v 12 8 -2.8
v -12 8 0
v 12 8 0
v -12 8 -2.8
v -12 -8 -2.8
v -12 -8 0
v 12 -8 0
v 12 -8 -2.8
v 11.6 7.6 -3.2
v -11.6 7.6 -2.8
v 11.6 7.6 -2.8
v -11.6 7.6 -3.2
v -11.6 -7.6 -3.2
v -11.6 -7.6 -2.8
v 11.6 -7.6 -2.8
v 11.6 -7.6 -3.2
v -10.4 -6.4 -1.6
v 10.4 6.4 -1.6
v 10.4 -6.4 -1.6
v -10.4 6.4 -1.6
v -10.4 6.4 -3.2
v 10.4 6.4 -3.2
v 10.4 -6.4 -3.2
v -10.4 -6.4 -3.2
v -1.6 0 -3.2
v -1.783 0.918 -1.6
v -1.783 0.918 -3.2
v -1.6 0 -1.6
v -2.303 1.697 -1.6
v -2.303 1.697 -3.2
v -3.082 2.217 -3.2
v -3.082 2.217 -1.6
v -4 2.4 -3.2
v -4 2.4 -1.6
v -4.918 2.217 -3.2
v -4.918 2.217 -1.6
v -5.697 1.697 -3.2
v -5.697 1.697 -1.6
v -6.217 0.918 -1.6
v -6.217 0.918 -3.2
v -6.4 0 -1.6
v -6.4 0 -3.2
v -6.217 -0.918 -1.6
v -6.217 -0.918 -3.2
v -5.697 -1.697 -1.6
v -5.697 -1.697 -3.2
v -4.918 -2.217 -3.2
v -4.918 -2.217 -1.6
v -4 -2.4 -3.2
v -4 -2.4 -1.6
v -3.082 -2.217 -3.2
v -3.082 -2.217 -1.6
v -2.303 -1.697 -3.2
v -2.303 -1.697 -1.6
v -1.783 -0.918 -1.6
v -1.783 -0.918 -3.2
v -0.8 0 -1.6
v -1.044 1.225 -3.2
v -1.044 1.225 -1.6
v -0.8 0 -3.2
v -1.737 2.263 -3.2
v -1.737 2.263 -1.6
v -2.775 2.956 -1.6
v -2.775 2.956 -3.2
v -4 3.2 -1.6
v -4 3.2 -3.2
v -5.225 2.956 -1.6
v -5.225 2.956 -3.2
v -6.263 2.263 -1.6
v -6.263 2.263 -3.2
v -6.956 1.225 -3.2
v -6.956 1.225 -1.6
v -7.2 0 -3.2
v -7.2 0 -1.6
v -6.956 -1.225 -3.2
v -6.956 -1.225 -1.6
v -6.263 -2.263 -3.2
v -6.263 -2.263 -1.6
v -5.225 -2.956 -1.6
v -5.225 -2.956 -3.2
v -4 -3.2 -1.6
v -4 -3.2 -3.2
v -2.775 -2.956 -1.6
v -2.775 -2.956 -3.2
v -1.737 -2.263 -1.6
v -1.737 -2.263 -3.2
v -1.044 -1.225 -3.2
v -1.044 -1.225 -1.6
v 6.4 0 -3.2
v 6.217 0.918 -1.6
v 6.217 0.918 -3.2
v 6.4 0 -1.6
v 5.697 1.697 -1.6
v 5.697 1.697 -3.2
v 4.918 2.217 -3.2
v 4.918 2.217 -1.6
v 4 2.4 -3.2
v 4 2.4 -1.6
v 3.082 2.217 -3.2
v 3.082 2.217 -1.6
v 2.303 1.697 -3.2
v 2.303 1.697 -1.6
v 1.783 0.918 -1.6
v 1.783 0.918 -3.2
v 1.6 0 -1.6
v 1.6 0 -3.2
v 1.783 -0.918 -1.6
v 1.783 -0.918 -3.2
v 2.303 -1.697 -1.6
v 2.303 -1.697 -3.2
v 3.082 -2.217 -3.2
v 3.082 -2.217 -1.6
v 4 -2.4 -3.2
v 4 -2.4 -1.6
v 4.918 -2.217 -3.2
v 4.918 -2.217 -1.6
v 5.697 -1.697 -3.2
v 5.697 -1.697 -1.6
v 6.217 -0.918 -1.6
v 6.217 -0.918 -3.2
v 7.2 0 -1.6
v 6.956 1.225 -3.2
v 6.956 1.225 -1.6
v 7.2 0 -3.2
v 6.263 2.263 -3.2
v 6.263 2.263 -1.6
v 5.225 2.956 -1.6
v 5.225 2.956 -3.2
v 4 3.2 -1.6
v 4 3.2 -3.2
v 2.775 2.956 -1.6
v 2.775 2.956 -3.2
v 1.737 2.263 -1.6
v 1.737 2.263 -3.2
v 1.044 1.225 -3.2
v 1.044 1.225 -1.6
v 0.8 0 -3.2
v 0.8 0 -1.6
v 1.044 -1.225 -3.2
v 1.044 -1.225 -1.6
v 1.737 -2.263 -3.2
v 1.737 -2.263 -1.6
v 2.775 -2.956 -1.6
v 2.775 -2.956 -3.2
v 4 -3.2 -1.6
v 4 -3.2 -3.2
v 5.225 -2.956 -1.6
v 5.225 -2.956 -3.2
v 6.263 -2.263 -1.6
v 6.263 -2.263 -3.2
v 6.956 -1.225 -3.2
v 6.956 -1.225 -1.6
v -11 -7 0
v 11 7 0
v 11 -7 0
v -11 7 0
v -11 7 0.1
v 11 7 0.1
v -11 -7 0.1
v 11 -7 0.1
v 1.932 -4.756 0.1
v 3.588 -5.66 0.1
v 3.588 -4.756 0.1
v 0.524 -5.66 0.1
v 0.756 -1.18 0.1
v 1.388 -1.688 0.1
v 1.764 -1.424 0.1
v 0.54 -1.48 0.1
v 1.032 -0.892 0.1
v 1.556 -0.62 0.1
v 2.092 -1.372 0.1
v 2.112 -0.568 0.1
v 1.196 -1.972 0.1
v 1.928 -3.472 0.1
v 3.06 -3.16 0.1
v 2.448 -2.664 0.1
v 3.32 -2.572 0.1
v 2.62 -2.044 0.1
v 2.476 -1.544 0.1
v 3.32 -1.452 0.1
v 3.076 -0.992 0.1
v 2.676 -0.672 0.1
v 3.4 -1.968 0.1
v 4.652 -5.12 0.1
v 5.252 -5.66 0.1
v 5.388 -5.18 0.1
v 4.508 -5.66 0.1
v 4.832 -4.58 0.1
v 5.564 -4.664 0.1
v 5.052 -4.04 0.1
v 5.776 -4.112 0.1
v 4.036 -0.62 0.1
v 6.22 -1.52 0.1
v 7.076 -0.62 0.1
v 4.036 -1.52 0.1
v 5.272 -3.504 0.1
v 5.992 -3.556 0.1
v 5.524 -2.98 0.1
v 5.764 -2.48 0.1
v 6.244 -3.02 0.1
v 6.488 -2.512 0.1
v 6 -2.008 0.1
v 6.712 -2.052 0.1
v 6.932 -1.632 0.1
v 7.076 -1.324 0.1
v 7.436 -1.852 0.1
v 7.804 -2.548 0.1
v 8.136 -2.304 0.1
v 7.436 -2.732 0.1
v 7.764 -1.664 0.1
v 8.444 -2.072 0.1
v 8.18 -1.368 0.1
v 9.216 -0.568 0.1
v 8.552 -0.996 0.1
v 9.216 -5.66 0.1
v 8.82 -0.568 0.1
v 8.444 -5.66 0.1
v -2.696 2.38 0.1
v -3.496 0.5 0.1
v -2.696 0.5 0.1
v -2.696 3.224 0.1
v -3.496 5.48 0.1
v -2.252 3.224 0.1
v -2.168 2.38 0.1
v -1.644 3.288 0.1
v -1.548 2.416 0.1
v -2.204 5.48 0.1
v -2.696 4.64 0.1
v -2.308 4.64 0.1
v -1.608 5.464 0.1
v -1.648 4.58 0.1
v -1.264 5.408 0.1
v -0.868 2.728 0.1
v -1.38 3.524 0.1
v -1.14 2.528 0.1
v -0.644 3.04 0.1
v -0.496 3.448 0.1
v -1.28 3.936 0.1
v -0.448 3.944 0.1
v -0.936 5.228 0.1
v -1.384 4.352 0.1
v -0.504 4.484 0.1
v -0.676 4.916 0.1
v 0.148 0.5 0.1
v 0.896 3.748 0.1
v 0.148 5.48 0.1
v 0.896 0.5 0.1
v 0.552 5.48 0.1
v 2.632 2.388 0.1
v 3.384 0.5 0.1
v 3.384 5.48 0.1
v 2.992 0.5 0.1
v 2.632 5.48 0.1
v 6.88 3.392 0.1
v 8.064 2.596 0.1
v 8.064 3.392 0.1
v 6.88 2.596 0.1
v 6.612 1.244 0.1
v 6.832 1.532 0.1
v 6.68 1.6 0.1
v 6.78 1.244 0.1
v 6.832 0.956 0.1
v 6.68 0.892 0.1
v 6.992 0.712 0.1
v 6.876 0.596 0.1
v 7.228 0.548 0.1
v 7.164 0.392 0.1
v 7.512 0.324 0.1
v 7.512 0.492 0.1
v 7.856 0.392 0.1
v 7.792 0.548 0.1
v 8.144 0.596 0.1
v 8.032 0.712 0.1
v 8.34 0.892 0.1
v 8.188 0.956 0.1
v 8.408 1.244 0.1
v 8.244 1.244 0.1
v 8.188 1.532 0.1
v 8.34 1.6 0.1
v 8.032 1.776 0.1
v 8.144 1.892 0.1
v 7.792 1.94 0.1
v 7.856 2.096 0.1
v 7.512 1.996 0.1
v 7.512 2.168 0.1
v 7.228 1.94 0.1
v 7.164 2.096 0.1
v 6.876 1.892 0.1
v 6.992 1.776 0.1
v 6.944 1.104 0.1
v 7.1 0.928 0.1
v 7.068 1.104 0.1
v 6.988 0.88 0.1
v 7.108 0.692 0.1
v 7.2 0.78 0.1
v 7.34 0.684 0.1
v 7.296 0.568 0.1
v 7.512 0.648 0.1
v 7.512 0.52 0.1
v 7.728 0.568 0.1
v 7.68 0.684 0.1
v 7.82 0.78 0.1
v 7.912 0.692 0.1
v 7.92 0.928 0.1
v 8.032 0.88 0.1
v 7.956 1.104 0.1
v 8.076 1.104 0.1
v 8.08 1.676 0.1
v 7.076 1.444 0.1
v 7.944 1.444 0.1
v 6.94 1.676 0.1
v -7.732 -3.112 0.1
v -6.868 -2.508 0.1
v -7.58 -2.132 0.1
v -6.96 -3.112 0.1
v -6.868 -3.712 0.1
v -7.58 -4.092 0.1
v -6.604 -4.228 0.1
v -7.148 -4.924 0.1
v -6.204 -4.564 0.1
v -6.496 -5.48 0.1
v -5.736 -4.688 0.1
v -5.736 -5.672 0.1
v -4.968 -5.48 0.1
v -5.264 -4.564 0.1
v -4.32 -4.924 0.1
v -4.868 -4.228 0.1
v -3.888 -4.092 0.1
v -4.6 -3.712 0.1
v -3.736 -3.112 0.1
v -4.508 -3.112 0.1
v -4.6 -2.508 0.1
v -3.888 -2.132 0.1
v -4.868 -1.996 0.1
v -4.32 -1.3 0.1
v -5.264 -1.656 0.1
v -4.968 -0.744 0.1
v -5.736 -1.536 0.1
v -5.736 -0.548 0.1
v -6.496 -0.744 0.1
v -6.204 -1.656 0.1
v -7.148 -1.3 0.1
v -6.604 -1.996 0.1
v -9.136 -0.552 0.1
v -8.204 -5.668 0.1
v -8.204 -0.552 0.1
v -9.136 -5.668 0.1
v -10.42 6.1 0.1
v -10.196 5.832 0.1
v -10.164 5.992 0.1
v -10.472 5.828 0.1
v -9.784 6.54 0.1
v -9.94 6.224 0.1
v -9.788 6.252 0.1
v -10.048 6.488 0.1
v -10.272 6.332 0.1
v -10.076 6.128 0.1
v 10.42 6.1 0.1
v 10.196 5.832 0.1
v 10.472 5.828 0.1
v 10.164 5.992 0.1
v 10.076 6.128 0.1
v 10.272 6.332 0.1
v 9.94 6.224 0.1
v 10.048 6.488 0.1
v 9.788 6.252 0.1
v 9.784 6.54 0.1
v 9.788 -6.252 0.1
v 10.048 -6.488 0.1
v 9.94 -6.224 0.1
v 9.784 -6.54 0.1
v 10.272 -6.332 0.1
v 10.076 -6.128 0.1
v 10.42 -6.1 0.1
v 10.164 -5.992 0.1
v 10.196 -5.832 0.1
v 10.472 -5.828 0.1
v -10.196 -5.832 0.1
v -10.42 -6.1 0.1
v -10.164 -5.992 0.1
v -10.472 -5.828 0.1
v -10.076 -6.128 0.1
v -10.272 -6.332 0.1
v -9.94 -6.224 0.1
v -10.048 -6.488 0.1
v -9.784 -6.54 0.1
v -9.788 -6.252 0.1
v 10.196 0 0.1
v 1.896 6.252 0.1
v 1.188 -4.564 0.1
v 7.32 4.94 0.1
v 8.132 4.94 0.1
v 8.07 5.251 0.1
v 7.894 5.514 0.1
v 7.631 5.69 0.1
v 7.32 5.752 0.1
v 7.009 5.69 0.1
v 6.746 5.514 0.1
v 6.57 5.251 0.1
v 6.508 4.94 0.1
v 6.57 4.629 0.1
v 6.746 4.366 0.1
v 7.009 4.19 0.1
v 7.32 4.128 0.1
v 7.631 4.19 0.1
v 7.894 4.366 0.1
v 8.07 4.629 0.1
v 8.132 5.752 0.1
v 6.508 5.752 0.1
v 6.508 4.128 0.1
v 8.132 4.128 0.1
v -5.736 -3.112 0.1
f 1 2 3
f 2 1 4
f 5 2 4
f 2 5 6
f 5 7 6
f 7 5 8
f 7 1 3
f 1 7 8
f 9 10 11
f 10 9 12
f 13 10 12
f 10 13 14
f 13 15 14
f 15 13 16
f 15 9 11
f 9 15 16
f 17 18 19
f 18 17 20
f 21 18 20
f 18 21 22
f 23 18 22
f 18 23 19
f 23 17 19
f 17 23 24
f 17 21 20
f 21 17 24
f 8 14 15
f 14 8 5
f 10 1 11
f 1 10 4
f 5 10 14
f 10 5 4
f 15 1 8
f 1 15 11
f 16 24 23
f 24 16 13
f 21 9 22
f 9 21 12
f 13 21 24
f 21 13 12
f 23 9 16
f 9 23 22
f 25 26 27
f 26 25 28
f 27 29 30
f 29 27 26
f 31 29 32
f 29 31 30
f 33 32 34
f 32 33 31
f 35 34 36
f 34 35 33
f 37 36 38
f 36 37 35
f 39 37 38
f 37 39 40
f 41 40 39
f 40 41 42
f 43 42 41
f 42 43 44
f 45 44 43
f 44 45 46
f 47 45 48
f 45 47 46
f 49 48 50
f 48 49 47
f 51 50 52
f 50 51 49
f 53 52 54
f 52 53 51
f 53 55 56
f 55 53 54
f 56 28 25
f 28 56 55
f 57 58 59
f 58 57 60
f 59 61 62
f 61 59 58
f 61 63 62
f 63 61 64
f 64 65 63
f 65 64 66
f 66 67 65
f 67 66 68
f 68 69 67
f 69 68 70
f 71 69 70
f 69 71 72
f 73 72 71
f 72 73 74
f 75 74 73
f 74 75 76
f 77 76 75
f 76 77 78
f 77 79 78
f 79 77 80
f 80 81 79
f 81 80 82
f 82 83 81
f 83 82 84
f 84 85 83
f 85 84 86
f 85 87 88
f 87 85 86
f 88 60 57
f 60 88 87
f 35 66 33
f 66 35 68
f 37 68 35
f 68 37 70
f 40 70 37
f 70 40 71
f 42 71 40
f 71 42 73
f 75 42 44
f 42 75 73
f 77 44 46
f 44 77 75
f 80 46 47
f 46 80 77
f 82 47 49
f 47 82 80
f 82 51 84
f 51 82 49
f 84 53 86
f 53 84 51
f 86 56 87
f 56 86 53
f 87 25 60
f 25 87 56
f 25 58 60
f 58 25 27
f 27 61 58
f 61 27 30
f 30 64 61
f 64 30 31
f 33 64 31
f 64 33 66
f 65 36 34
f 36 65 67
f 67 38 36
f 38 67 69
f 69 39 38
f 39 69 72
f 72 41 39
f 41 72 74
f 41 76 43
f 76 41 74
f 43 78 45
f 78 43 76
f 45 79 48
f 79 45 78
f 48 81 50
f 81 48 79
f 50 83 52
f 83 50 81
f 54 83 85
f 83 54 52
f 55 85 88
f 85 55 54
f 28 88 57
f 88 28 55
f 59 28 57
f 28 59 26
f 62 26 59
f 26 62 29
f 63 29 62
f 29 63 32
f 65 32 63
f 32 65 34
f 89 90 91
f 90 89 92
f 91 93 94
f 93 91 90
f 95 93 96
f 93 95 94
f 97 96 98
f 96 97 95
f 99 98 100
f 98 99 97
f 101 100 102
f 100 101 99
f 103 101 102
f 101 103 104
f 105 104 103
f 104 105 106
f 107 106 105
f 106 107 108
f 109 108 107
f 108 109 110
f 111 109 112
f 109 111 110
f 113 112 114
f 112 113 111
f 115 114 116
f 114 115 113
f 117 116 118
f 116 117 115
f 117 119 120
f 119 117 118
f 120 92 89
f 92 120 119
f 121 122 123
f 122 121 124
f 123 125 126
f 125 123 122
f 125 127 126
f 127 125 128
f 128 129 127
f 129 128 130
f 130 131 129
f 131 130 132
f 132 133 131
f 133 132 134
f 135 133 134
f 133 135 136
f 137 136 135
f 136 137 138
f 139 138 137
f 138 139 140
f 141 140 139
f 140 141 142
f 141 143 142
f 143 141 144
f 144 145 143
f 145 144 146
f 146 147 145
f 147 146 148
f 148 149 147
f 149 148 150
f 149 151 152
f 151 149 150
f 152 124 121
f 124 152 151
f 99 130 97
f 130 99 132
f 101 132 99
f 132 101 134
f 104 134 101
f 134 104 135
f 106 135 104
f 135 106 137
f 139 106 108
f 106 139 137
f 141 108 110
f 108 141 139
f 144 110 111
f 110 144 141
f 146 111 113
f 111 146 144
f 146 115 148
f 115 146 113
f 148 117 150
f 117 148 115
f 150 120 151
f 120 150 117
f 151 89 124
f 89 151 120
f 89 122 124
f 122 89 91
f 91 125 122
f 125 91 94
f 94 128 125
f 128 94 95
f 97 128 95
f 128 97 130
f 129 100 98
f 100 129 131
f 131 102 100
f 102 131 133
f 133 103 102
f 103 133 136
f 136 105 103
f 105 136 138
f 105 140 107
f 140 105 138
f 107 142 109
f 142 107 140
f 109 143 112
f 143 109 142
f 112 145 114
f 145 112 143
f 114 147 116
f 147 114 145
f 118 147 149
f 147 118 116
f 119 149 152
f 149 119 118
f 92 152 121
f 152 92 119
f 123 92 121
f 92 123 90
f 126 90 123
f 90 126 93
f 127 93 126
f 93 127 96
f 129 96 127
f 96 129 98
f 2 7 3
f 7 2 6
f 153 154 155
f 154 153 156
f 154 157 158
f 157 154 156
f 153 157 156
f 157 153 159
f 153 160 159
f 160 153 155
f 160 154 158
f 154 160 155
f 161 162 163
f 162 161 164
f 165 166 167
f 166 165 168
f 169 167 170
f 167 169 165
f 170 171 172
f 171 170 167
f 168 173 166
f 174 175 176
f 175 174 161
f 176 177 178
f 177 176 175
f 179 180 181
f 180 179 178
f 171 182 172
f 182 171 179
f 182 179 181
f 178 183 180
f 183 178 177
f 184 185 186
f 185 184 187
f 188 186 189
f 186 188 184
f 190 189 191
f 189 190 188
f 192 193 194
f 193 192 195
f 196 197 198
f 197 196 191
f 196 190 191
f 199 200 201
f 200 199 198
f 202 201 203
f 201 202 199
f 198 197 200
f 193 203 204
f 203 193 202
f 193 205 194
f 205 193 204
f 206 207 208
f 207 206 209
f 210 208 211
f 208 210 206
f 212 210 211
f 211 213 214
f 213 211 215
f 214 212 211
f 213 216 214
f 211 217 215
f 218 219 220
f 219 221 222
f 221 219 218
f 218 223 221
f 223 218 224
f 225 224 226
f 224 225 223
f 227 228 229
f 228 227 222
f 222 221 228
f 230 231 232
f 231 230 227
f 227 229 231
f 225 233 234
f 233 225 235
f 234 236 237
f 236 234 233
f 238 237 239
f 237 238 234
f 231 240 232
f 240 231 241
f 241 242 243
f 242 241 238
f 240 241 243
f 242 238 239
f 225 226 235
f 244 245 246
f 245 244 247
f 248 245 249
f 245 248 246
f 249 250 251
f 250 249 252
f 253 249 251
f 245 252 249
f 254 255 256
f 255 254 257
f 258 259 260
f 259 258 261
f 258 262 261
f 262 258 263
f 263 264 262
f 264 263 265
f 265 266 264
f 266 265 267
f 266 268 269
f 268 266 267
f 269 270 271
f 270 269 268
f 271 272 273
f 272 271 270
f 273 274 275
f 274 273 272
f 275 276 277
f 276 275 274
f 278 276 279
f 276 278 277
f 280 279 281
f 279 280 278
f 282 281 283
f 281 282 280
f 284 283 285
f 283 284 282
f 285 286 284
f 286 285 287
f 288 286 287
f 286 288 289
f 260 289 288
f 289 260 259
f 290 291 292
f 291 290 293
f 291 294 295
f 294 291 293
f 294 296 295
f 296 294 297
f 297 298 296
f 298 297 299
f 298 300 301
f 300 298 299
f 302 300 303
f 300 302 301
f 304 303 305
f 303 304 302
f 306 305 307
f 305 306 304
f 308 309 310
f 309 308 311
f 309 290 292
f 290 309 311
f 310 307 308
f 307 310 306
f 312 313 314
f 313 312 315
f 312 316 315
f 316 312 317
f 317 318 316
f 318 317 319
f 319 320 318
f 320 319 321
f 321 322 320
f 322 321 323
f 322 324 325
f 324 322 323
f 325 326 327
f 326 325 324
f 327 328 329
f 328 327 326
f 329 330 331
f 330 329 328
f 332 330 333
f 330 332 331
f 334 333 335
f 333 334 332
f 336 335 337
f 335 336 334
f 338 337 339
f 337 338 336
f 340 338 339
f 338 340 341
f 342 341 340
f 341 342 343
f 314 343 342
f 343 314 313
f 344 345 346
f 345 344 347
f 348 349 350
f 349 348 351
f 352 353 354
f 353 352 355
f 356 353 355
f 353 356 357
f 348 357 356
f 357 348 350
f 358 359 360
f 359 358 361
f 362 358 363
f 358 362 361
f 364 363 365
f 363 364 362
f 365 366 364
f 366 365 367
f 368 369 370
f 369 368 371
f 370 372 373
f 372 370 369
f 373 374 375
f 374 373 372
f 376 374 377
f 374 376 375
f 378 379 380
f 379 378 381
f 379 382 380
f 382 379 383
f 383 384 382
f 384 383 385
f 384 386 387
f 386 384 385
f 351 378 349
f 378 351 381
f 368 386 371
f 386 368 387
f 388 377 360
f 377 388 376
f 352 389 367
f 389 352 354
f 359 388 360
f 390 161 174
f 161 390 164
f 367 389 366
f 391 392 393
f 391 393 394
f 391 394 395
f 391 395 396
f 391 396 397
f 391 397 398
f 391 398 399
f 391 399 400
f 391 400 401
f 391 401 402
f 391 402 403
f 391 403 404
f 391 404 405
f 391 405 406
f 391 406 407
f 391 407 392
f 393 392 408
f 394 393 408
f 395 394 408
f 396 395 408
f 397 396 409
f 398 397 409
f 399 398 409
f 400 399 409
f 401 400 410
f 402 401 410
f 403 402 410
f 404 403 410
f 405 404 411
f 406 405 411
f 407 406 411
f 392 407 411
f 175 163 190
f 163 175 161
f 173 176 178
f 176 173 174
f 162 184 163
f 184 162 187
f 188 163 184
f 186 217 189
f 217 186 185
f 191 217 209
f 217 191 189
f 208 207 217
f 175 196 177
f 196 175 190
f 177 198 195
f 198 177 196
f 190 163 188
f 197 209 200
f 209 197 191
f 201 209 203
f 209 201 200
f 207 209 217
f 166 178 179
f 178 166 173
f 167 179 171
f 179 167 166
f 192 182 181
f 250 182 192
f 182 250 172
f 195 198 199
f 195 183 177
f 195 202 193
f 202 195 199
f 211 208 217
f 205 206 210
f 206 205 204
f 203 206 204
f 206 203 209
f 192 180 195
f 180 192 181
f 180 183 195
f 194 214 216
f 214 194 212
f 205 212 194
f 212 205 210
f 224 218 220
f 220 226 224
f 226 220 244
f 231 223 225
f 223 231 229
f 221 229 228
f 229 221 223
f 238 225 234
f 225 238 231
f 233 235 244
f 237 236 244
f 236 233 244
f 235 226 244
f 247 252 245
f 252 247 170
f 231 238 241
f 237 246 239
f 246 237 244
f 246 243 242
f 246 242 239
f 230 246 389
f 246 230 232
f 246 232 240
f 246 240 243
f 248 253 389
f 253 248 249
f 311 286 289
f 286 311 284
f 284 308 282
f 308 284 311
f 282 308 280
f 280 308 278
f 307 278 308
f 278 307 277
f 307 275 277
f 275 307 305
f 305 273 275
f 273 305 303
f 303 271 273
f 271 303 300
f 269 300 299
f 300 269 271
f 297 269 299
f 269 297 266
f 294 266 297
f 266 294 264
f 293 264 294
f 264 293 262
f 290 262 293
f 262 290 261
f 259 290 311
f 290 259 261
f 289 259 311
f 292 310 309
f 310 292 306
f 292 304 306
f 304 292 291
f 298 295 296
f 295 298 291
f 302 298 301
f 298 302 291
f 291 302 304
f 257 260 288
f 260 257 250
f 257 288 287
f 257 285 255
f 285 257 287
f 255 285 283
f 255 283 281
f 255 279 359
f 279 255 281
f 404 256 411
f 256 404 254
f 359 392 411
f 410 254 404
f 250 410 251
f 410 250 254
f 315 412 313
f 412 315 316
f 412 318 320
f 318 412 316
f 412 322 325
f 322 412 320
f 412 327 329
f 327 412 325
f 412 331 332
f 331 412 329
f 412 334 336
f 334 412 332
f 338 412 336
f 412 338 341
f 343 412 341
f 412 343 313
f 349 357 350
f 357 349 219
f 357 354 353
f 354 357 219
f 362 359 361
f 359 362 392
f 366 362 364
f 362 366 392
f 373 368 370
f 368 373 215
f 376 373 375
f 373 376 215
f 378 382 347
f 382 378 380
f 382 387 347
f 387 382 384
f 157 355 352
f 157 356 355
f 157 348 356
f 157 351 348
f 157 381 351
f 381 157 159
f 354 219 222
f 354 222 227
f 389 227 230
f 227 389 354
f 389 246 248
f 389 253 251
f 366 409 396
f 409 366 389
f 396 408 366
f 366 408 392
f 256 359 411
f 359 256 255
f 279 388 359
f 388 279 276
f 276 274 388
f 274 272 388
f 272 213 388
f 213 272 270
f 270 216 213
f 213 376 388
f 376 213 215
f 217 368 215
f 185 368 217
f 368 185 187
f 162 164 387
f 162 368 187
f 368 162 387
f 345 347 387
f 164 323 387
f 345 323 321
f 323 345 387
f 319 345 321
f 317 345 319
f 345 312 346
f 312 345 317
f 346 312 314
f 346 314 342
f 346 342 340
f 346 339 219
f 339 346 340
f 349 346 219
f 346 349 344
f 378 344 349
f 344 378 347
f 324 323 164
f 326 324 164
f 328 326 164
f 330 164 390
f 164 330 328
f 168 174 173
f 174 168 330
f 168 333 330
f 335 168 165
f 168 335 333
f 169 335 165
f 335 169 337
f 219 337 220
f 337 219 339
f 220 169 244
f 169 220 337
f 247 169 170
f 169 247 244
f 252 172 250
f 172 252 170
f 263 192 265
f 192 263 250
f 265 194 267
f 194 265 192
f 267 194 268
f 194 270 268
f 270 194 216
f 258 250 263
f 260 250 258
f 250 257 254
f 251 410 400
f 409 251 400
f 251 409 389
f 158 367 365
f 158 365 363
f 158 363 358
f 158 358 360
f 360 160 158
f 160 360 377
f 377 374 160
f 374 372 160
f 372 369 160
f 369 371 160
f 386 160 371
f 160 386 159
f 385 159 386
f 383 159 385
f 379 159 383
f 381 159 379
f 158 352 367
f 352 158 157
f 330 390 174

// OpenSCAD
use <../lib.scad>
use <26603.scad>
use <6296256n.scad>
function ldraw_lib__26603d0p() = [
// 0 Tile  2 x  3 with Black "PN IO 271" on White Background Sticker
// 0 Name: 26603d0p.dat
// 0 Author: Evert-Jan Boer [ejboer]
// 0 !LDRAW_ORG Shortcut UPDATE 2026-07
// 0 !LICENSE Licensed under CC BY 4.0 : see CAreadme.txt
// 
// 0 BFC CERTIFY CCW
  [0,"BFC","CERTIFY"],
  [0,"BFC","CCW"],
// 
// 0 !CATEGORY Sticker Shortcut
// 0 !KEYWORDS Bricklink 26603pb146, Fiat 500, set 10271
// 
// 0 !HISTORY 2026-07-30 [OrionP] Official Update 2026-07
// 
// 1 16 0 0 0 1 0 0 0 1 0 0 0 1 26603.dat
  [1,16,0,0,0,1,0,0,0,1,0,0,0,1, ldraw_lib__26603()],
// 1 16 0 0 0 1 0 0 0 1 0 0 0 1 6296256n.dat
  [1,16,0,0,0,1,0,0,0,1,0,0,0,1, ldraw_lib__6296256n()],
];
module ldraw_lib__26603d0p(step=0, col=false, unit=2/5, alt=false, line=0.2, solid=!$preview)
    makepoly(ldraw_lib__26603d0p(), step=step, col=col, unit=unit, alt=alt, line=line, solid=solid);
ldraw_lib__26603d0p(line=0.2);
